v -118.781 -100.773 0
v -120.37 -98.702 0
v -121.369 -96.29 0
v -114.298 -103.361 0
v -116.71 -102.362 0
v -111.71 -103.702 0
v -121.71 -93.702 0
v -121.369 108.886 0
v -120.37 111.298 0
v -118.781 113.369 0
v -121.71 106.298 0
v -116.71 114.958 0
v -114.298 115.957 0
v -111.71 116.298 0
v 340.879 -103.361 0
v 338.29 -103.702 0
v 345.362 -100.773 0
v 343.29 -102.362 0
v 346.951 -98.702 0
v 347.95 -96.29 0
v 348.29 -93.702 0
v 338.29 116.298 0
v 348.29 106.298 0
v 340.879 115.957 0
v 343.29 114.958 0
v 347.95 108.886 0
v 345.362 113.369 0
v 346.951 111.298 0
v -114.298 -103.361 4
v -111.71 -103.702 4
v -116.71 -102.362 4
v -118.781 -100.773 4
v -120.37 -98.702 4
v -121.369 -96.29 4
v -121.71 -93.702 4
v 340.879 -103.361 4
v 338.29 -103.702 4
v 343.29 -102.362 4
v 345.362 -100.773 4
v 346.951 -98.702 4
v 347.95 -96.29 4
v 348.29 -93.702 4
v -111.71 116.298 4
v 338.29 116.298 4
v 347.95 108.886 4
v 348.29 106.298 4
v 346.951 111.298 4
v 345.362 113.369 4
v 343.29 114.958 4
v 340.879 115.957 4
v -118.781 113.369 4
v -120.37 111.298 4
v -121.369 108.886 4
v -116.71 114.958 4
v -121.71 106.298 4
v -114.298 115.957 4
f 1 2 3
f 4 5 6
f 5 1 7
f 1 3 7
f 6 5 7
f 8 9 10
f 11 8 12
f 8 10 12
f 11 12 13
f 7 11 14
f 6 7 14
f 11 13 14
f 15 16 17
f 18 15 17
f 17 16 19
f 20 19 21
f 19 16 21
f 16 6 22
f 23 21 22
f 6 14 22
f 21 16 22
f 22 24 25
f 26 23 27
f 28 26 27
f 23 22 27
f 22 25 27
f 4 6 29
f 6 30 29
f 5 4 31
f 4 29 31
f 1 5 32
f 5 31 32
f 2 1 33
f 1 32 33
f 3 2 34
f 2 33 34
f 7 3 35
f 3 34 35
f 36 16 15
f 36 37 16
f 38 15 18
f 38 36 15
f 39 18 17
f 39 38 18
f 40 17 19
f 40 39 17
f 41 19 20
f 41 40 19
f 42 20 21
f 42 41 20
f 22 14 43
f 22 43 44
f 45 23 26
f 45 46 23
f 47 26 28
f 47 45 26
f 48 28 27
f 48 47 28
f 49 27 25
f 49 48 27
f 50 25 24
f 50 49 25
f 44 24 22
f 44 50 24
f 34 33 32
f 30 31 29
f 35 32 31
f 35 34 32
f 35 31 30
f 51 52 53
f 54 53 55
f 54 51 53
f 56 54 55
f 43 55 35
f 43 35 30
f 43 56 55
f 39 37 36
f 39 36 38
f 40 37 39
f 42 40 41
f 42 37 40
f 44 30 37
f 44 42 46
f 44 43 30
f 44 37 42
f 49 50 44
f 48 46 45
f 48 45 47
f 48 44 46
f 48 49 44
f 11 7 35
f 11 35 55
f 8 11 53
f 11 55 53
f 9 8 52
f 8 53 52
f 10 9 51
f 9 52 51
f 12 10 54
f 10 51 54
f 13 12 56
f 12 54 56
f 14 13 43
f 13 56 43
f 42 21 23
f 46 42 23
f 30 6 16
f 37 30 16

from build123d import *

# Parameters (mm, degrees)
SKETCH_W    = 470
SKETCH_H    = 220
PAD_DEPTH   = 4
FILLET_R    = 10
FILLET001_R = 10
FILLET002_R = 10
FILLET003_R = 10


with BuildPart() as part:
    # Sketch → Pad (new body)
    with BuildSketch(Plane.XY):
        with Locations((113.290486, 6.298135)):
            Rectangle(SKETCH_W, SKETCH_H)
    extrude(amount=PAD_DEPTH)

    # Fillet
    fillet_edges = [part.edges().sort_by_distance(p)[0] for p in [
        (348.290486, -103.701865, 2),
    ]]
    fillet(fillet_edges, radius=FILLET_R)

    # Fillet001
    fillet001_edges = [part.edges().sort_by_distance(p)[0] for p in [
        (348.290486, 116.298135, 2),
    ]]
    fillet(fillet001_edges, radius=FILLET001_R)

    # Fillet002
    fillet002_edges = [part.edges().sort_by_distance(p)[0] for p in [
        (-121.709514, -103.701865, 2),
    ]]
    fillet(fillet002_edges, radius=FILLET002_R)

    # Fillet003
    fillet003_edges = [part.edges().sort_by_distance(p)[0] for p in [
        (-121.709514, 116.298135, 2),
    ]]
    fillet(fillet003_edges, radius=FILLET003_R)


solid = part.part
